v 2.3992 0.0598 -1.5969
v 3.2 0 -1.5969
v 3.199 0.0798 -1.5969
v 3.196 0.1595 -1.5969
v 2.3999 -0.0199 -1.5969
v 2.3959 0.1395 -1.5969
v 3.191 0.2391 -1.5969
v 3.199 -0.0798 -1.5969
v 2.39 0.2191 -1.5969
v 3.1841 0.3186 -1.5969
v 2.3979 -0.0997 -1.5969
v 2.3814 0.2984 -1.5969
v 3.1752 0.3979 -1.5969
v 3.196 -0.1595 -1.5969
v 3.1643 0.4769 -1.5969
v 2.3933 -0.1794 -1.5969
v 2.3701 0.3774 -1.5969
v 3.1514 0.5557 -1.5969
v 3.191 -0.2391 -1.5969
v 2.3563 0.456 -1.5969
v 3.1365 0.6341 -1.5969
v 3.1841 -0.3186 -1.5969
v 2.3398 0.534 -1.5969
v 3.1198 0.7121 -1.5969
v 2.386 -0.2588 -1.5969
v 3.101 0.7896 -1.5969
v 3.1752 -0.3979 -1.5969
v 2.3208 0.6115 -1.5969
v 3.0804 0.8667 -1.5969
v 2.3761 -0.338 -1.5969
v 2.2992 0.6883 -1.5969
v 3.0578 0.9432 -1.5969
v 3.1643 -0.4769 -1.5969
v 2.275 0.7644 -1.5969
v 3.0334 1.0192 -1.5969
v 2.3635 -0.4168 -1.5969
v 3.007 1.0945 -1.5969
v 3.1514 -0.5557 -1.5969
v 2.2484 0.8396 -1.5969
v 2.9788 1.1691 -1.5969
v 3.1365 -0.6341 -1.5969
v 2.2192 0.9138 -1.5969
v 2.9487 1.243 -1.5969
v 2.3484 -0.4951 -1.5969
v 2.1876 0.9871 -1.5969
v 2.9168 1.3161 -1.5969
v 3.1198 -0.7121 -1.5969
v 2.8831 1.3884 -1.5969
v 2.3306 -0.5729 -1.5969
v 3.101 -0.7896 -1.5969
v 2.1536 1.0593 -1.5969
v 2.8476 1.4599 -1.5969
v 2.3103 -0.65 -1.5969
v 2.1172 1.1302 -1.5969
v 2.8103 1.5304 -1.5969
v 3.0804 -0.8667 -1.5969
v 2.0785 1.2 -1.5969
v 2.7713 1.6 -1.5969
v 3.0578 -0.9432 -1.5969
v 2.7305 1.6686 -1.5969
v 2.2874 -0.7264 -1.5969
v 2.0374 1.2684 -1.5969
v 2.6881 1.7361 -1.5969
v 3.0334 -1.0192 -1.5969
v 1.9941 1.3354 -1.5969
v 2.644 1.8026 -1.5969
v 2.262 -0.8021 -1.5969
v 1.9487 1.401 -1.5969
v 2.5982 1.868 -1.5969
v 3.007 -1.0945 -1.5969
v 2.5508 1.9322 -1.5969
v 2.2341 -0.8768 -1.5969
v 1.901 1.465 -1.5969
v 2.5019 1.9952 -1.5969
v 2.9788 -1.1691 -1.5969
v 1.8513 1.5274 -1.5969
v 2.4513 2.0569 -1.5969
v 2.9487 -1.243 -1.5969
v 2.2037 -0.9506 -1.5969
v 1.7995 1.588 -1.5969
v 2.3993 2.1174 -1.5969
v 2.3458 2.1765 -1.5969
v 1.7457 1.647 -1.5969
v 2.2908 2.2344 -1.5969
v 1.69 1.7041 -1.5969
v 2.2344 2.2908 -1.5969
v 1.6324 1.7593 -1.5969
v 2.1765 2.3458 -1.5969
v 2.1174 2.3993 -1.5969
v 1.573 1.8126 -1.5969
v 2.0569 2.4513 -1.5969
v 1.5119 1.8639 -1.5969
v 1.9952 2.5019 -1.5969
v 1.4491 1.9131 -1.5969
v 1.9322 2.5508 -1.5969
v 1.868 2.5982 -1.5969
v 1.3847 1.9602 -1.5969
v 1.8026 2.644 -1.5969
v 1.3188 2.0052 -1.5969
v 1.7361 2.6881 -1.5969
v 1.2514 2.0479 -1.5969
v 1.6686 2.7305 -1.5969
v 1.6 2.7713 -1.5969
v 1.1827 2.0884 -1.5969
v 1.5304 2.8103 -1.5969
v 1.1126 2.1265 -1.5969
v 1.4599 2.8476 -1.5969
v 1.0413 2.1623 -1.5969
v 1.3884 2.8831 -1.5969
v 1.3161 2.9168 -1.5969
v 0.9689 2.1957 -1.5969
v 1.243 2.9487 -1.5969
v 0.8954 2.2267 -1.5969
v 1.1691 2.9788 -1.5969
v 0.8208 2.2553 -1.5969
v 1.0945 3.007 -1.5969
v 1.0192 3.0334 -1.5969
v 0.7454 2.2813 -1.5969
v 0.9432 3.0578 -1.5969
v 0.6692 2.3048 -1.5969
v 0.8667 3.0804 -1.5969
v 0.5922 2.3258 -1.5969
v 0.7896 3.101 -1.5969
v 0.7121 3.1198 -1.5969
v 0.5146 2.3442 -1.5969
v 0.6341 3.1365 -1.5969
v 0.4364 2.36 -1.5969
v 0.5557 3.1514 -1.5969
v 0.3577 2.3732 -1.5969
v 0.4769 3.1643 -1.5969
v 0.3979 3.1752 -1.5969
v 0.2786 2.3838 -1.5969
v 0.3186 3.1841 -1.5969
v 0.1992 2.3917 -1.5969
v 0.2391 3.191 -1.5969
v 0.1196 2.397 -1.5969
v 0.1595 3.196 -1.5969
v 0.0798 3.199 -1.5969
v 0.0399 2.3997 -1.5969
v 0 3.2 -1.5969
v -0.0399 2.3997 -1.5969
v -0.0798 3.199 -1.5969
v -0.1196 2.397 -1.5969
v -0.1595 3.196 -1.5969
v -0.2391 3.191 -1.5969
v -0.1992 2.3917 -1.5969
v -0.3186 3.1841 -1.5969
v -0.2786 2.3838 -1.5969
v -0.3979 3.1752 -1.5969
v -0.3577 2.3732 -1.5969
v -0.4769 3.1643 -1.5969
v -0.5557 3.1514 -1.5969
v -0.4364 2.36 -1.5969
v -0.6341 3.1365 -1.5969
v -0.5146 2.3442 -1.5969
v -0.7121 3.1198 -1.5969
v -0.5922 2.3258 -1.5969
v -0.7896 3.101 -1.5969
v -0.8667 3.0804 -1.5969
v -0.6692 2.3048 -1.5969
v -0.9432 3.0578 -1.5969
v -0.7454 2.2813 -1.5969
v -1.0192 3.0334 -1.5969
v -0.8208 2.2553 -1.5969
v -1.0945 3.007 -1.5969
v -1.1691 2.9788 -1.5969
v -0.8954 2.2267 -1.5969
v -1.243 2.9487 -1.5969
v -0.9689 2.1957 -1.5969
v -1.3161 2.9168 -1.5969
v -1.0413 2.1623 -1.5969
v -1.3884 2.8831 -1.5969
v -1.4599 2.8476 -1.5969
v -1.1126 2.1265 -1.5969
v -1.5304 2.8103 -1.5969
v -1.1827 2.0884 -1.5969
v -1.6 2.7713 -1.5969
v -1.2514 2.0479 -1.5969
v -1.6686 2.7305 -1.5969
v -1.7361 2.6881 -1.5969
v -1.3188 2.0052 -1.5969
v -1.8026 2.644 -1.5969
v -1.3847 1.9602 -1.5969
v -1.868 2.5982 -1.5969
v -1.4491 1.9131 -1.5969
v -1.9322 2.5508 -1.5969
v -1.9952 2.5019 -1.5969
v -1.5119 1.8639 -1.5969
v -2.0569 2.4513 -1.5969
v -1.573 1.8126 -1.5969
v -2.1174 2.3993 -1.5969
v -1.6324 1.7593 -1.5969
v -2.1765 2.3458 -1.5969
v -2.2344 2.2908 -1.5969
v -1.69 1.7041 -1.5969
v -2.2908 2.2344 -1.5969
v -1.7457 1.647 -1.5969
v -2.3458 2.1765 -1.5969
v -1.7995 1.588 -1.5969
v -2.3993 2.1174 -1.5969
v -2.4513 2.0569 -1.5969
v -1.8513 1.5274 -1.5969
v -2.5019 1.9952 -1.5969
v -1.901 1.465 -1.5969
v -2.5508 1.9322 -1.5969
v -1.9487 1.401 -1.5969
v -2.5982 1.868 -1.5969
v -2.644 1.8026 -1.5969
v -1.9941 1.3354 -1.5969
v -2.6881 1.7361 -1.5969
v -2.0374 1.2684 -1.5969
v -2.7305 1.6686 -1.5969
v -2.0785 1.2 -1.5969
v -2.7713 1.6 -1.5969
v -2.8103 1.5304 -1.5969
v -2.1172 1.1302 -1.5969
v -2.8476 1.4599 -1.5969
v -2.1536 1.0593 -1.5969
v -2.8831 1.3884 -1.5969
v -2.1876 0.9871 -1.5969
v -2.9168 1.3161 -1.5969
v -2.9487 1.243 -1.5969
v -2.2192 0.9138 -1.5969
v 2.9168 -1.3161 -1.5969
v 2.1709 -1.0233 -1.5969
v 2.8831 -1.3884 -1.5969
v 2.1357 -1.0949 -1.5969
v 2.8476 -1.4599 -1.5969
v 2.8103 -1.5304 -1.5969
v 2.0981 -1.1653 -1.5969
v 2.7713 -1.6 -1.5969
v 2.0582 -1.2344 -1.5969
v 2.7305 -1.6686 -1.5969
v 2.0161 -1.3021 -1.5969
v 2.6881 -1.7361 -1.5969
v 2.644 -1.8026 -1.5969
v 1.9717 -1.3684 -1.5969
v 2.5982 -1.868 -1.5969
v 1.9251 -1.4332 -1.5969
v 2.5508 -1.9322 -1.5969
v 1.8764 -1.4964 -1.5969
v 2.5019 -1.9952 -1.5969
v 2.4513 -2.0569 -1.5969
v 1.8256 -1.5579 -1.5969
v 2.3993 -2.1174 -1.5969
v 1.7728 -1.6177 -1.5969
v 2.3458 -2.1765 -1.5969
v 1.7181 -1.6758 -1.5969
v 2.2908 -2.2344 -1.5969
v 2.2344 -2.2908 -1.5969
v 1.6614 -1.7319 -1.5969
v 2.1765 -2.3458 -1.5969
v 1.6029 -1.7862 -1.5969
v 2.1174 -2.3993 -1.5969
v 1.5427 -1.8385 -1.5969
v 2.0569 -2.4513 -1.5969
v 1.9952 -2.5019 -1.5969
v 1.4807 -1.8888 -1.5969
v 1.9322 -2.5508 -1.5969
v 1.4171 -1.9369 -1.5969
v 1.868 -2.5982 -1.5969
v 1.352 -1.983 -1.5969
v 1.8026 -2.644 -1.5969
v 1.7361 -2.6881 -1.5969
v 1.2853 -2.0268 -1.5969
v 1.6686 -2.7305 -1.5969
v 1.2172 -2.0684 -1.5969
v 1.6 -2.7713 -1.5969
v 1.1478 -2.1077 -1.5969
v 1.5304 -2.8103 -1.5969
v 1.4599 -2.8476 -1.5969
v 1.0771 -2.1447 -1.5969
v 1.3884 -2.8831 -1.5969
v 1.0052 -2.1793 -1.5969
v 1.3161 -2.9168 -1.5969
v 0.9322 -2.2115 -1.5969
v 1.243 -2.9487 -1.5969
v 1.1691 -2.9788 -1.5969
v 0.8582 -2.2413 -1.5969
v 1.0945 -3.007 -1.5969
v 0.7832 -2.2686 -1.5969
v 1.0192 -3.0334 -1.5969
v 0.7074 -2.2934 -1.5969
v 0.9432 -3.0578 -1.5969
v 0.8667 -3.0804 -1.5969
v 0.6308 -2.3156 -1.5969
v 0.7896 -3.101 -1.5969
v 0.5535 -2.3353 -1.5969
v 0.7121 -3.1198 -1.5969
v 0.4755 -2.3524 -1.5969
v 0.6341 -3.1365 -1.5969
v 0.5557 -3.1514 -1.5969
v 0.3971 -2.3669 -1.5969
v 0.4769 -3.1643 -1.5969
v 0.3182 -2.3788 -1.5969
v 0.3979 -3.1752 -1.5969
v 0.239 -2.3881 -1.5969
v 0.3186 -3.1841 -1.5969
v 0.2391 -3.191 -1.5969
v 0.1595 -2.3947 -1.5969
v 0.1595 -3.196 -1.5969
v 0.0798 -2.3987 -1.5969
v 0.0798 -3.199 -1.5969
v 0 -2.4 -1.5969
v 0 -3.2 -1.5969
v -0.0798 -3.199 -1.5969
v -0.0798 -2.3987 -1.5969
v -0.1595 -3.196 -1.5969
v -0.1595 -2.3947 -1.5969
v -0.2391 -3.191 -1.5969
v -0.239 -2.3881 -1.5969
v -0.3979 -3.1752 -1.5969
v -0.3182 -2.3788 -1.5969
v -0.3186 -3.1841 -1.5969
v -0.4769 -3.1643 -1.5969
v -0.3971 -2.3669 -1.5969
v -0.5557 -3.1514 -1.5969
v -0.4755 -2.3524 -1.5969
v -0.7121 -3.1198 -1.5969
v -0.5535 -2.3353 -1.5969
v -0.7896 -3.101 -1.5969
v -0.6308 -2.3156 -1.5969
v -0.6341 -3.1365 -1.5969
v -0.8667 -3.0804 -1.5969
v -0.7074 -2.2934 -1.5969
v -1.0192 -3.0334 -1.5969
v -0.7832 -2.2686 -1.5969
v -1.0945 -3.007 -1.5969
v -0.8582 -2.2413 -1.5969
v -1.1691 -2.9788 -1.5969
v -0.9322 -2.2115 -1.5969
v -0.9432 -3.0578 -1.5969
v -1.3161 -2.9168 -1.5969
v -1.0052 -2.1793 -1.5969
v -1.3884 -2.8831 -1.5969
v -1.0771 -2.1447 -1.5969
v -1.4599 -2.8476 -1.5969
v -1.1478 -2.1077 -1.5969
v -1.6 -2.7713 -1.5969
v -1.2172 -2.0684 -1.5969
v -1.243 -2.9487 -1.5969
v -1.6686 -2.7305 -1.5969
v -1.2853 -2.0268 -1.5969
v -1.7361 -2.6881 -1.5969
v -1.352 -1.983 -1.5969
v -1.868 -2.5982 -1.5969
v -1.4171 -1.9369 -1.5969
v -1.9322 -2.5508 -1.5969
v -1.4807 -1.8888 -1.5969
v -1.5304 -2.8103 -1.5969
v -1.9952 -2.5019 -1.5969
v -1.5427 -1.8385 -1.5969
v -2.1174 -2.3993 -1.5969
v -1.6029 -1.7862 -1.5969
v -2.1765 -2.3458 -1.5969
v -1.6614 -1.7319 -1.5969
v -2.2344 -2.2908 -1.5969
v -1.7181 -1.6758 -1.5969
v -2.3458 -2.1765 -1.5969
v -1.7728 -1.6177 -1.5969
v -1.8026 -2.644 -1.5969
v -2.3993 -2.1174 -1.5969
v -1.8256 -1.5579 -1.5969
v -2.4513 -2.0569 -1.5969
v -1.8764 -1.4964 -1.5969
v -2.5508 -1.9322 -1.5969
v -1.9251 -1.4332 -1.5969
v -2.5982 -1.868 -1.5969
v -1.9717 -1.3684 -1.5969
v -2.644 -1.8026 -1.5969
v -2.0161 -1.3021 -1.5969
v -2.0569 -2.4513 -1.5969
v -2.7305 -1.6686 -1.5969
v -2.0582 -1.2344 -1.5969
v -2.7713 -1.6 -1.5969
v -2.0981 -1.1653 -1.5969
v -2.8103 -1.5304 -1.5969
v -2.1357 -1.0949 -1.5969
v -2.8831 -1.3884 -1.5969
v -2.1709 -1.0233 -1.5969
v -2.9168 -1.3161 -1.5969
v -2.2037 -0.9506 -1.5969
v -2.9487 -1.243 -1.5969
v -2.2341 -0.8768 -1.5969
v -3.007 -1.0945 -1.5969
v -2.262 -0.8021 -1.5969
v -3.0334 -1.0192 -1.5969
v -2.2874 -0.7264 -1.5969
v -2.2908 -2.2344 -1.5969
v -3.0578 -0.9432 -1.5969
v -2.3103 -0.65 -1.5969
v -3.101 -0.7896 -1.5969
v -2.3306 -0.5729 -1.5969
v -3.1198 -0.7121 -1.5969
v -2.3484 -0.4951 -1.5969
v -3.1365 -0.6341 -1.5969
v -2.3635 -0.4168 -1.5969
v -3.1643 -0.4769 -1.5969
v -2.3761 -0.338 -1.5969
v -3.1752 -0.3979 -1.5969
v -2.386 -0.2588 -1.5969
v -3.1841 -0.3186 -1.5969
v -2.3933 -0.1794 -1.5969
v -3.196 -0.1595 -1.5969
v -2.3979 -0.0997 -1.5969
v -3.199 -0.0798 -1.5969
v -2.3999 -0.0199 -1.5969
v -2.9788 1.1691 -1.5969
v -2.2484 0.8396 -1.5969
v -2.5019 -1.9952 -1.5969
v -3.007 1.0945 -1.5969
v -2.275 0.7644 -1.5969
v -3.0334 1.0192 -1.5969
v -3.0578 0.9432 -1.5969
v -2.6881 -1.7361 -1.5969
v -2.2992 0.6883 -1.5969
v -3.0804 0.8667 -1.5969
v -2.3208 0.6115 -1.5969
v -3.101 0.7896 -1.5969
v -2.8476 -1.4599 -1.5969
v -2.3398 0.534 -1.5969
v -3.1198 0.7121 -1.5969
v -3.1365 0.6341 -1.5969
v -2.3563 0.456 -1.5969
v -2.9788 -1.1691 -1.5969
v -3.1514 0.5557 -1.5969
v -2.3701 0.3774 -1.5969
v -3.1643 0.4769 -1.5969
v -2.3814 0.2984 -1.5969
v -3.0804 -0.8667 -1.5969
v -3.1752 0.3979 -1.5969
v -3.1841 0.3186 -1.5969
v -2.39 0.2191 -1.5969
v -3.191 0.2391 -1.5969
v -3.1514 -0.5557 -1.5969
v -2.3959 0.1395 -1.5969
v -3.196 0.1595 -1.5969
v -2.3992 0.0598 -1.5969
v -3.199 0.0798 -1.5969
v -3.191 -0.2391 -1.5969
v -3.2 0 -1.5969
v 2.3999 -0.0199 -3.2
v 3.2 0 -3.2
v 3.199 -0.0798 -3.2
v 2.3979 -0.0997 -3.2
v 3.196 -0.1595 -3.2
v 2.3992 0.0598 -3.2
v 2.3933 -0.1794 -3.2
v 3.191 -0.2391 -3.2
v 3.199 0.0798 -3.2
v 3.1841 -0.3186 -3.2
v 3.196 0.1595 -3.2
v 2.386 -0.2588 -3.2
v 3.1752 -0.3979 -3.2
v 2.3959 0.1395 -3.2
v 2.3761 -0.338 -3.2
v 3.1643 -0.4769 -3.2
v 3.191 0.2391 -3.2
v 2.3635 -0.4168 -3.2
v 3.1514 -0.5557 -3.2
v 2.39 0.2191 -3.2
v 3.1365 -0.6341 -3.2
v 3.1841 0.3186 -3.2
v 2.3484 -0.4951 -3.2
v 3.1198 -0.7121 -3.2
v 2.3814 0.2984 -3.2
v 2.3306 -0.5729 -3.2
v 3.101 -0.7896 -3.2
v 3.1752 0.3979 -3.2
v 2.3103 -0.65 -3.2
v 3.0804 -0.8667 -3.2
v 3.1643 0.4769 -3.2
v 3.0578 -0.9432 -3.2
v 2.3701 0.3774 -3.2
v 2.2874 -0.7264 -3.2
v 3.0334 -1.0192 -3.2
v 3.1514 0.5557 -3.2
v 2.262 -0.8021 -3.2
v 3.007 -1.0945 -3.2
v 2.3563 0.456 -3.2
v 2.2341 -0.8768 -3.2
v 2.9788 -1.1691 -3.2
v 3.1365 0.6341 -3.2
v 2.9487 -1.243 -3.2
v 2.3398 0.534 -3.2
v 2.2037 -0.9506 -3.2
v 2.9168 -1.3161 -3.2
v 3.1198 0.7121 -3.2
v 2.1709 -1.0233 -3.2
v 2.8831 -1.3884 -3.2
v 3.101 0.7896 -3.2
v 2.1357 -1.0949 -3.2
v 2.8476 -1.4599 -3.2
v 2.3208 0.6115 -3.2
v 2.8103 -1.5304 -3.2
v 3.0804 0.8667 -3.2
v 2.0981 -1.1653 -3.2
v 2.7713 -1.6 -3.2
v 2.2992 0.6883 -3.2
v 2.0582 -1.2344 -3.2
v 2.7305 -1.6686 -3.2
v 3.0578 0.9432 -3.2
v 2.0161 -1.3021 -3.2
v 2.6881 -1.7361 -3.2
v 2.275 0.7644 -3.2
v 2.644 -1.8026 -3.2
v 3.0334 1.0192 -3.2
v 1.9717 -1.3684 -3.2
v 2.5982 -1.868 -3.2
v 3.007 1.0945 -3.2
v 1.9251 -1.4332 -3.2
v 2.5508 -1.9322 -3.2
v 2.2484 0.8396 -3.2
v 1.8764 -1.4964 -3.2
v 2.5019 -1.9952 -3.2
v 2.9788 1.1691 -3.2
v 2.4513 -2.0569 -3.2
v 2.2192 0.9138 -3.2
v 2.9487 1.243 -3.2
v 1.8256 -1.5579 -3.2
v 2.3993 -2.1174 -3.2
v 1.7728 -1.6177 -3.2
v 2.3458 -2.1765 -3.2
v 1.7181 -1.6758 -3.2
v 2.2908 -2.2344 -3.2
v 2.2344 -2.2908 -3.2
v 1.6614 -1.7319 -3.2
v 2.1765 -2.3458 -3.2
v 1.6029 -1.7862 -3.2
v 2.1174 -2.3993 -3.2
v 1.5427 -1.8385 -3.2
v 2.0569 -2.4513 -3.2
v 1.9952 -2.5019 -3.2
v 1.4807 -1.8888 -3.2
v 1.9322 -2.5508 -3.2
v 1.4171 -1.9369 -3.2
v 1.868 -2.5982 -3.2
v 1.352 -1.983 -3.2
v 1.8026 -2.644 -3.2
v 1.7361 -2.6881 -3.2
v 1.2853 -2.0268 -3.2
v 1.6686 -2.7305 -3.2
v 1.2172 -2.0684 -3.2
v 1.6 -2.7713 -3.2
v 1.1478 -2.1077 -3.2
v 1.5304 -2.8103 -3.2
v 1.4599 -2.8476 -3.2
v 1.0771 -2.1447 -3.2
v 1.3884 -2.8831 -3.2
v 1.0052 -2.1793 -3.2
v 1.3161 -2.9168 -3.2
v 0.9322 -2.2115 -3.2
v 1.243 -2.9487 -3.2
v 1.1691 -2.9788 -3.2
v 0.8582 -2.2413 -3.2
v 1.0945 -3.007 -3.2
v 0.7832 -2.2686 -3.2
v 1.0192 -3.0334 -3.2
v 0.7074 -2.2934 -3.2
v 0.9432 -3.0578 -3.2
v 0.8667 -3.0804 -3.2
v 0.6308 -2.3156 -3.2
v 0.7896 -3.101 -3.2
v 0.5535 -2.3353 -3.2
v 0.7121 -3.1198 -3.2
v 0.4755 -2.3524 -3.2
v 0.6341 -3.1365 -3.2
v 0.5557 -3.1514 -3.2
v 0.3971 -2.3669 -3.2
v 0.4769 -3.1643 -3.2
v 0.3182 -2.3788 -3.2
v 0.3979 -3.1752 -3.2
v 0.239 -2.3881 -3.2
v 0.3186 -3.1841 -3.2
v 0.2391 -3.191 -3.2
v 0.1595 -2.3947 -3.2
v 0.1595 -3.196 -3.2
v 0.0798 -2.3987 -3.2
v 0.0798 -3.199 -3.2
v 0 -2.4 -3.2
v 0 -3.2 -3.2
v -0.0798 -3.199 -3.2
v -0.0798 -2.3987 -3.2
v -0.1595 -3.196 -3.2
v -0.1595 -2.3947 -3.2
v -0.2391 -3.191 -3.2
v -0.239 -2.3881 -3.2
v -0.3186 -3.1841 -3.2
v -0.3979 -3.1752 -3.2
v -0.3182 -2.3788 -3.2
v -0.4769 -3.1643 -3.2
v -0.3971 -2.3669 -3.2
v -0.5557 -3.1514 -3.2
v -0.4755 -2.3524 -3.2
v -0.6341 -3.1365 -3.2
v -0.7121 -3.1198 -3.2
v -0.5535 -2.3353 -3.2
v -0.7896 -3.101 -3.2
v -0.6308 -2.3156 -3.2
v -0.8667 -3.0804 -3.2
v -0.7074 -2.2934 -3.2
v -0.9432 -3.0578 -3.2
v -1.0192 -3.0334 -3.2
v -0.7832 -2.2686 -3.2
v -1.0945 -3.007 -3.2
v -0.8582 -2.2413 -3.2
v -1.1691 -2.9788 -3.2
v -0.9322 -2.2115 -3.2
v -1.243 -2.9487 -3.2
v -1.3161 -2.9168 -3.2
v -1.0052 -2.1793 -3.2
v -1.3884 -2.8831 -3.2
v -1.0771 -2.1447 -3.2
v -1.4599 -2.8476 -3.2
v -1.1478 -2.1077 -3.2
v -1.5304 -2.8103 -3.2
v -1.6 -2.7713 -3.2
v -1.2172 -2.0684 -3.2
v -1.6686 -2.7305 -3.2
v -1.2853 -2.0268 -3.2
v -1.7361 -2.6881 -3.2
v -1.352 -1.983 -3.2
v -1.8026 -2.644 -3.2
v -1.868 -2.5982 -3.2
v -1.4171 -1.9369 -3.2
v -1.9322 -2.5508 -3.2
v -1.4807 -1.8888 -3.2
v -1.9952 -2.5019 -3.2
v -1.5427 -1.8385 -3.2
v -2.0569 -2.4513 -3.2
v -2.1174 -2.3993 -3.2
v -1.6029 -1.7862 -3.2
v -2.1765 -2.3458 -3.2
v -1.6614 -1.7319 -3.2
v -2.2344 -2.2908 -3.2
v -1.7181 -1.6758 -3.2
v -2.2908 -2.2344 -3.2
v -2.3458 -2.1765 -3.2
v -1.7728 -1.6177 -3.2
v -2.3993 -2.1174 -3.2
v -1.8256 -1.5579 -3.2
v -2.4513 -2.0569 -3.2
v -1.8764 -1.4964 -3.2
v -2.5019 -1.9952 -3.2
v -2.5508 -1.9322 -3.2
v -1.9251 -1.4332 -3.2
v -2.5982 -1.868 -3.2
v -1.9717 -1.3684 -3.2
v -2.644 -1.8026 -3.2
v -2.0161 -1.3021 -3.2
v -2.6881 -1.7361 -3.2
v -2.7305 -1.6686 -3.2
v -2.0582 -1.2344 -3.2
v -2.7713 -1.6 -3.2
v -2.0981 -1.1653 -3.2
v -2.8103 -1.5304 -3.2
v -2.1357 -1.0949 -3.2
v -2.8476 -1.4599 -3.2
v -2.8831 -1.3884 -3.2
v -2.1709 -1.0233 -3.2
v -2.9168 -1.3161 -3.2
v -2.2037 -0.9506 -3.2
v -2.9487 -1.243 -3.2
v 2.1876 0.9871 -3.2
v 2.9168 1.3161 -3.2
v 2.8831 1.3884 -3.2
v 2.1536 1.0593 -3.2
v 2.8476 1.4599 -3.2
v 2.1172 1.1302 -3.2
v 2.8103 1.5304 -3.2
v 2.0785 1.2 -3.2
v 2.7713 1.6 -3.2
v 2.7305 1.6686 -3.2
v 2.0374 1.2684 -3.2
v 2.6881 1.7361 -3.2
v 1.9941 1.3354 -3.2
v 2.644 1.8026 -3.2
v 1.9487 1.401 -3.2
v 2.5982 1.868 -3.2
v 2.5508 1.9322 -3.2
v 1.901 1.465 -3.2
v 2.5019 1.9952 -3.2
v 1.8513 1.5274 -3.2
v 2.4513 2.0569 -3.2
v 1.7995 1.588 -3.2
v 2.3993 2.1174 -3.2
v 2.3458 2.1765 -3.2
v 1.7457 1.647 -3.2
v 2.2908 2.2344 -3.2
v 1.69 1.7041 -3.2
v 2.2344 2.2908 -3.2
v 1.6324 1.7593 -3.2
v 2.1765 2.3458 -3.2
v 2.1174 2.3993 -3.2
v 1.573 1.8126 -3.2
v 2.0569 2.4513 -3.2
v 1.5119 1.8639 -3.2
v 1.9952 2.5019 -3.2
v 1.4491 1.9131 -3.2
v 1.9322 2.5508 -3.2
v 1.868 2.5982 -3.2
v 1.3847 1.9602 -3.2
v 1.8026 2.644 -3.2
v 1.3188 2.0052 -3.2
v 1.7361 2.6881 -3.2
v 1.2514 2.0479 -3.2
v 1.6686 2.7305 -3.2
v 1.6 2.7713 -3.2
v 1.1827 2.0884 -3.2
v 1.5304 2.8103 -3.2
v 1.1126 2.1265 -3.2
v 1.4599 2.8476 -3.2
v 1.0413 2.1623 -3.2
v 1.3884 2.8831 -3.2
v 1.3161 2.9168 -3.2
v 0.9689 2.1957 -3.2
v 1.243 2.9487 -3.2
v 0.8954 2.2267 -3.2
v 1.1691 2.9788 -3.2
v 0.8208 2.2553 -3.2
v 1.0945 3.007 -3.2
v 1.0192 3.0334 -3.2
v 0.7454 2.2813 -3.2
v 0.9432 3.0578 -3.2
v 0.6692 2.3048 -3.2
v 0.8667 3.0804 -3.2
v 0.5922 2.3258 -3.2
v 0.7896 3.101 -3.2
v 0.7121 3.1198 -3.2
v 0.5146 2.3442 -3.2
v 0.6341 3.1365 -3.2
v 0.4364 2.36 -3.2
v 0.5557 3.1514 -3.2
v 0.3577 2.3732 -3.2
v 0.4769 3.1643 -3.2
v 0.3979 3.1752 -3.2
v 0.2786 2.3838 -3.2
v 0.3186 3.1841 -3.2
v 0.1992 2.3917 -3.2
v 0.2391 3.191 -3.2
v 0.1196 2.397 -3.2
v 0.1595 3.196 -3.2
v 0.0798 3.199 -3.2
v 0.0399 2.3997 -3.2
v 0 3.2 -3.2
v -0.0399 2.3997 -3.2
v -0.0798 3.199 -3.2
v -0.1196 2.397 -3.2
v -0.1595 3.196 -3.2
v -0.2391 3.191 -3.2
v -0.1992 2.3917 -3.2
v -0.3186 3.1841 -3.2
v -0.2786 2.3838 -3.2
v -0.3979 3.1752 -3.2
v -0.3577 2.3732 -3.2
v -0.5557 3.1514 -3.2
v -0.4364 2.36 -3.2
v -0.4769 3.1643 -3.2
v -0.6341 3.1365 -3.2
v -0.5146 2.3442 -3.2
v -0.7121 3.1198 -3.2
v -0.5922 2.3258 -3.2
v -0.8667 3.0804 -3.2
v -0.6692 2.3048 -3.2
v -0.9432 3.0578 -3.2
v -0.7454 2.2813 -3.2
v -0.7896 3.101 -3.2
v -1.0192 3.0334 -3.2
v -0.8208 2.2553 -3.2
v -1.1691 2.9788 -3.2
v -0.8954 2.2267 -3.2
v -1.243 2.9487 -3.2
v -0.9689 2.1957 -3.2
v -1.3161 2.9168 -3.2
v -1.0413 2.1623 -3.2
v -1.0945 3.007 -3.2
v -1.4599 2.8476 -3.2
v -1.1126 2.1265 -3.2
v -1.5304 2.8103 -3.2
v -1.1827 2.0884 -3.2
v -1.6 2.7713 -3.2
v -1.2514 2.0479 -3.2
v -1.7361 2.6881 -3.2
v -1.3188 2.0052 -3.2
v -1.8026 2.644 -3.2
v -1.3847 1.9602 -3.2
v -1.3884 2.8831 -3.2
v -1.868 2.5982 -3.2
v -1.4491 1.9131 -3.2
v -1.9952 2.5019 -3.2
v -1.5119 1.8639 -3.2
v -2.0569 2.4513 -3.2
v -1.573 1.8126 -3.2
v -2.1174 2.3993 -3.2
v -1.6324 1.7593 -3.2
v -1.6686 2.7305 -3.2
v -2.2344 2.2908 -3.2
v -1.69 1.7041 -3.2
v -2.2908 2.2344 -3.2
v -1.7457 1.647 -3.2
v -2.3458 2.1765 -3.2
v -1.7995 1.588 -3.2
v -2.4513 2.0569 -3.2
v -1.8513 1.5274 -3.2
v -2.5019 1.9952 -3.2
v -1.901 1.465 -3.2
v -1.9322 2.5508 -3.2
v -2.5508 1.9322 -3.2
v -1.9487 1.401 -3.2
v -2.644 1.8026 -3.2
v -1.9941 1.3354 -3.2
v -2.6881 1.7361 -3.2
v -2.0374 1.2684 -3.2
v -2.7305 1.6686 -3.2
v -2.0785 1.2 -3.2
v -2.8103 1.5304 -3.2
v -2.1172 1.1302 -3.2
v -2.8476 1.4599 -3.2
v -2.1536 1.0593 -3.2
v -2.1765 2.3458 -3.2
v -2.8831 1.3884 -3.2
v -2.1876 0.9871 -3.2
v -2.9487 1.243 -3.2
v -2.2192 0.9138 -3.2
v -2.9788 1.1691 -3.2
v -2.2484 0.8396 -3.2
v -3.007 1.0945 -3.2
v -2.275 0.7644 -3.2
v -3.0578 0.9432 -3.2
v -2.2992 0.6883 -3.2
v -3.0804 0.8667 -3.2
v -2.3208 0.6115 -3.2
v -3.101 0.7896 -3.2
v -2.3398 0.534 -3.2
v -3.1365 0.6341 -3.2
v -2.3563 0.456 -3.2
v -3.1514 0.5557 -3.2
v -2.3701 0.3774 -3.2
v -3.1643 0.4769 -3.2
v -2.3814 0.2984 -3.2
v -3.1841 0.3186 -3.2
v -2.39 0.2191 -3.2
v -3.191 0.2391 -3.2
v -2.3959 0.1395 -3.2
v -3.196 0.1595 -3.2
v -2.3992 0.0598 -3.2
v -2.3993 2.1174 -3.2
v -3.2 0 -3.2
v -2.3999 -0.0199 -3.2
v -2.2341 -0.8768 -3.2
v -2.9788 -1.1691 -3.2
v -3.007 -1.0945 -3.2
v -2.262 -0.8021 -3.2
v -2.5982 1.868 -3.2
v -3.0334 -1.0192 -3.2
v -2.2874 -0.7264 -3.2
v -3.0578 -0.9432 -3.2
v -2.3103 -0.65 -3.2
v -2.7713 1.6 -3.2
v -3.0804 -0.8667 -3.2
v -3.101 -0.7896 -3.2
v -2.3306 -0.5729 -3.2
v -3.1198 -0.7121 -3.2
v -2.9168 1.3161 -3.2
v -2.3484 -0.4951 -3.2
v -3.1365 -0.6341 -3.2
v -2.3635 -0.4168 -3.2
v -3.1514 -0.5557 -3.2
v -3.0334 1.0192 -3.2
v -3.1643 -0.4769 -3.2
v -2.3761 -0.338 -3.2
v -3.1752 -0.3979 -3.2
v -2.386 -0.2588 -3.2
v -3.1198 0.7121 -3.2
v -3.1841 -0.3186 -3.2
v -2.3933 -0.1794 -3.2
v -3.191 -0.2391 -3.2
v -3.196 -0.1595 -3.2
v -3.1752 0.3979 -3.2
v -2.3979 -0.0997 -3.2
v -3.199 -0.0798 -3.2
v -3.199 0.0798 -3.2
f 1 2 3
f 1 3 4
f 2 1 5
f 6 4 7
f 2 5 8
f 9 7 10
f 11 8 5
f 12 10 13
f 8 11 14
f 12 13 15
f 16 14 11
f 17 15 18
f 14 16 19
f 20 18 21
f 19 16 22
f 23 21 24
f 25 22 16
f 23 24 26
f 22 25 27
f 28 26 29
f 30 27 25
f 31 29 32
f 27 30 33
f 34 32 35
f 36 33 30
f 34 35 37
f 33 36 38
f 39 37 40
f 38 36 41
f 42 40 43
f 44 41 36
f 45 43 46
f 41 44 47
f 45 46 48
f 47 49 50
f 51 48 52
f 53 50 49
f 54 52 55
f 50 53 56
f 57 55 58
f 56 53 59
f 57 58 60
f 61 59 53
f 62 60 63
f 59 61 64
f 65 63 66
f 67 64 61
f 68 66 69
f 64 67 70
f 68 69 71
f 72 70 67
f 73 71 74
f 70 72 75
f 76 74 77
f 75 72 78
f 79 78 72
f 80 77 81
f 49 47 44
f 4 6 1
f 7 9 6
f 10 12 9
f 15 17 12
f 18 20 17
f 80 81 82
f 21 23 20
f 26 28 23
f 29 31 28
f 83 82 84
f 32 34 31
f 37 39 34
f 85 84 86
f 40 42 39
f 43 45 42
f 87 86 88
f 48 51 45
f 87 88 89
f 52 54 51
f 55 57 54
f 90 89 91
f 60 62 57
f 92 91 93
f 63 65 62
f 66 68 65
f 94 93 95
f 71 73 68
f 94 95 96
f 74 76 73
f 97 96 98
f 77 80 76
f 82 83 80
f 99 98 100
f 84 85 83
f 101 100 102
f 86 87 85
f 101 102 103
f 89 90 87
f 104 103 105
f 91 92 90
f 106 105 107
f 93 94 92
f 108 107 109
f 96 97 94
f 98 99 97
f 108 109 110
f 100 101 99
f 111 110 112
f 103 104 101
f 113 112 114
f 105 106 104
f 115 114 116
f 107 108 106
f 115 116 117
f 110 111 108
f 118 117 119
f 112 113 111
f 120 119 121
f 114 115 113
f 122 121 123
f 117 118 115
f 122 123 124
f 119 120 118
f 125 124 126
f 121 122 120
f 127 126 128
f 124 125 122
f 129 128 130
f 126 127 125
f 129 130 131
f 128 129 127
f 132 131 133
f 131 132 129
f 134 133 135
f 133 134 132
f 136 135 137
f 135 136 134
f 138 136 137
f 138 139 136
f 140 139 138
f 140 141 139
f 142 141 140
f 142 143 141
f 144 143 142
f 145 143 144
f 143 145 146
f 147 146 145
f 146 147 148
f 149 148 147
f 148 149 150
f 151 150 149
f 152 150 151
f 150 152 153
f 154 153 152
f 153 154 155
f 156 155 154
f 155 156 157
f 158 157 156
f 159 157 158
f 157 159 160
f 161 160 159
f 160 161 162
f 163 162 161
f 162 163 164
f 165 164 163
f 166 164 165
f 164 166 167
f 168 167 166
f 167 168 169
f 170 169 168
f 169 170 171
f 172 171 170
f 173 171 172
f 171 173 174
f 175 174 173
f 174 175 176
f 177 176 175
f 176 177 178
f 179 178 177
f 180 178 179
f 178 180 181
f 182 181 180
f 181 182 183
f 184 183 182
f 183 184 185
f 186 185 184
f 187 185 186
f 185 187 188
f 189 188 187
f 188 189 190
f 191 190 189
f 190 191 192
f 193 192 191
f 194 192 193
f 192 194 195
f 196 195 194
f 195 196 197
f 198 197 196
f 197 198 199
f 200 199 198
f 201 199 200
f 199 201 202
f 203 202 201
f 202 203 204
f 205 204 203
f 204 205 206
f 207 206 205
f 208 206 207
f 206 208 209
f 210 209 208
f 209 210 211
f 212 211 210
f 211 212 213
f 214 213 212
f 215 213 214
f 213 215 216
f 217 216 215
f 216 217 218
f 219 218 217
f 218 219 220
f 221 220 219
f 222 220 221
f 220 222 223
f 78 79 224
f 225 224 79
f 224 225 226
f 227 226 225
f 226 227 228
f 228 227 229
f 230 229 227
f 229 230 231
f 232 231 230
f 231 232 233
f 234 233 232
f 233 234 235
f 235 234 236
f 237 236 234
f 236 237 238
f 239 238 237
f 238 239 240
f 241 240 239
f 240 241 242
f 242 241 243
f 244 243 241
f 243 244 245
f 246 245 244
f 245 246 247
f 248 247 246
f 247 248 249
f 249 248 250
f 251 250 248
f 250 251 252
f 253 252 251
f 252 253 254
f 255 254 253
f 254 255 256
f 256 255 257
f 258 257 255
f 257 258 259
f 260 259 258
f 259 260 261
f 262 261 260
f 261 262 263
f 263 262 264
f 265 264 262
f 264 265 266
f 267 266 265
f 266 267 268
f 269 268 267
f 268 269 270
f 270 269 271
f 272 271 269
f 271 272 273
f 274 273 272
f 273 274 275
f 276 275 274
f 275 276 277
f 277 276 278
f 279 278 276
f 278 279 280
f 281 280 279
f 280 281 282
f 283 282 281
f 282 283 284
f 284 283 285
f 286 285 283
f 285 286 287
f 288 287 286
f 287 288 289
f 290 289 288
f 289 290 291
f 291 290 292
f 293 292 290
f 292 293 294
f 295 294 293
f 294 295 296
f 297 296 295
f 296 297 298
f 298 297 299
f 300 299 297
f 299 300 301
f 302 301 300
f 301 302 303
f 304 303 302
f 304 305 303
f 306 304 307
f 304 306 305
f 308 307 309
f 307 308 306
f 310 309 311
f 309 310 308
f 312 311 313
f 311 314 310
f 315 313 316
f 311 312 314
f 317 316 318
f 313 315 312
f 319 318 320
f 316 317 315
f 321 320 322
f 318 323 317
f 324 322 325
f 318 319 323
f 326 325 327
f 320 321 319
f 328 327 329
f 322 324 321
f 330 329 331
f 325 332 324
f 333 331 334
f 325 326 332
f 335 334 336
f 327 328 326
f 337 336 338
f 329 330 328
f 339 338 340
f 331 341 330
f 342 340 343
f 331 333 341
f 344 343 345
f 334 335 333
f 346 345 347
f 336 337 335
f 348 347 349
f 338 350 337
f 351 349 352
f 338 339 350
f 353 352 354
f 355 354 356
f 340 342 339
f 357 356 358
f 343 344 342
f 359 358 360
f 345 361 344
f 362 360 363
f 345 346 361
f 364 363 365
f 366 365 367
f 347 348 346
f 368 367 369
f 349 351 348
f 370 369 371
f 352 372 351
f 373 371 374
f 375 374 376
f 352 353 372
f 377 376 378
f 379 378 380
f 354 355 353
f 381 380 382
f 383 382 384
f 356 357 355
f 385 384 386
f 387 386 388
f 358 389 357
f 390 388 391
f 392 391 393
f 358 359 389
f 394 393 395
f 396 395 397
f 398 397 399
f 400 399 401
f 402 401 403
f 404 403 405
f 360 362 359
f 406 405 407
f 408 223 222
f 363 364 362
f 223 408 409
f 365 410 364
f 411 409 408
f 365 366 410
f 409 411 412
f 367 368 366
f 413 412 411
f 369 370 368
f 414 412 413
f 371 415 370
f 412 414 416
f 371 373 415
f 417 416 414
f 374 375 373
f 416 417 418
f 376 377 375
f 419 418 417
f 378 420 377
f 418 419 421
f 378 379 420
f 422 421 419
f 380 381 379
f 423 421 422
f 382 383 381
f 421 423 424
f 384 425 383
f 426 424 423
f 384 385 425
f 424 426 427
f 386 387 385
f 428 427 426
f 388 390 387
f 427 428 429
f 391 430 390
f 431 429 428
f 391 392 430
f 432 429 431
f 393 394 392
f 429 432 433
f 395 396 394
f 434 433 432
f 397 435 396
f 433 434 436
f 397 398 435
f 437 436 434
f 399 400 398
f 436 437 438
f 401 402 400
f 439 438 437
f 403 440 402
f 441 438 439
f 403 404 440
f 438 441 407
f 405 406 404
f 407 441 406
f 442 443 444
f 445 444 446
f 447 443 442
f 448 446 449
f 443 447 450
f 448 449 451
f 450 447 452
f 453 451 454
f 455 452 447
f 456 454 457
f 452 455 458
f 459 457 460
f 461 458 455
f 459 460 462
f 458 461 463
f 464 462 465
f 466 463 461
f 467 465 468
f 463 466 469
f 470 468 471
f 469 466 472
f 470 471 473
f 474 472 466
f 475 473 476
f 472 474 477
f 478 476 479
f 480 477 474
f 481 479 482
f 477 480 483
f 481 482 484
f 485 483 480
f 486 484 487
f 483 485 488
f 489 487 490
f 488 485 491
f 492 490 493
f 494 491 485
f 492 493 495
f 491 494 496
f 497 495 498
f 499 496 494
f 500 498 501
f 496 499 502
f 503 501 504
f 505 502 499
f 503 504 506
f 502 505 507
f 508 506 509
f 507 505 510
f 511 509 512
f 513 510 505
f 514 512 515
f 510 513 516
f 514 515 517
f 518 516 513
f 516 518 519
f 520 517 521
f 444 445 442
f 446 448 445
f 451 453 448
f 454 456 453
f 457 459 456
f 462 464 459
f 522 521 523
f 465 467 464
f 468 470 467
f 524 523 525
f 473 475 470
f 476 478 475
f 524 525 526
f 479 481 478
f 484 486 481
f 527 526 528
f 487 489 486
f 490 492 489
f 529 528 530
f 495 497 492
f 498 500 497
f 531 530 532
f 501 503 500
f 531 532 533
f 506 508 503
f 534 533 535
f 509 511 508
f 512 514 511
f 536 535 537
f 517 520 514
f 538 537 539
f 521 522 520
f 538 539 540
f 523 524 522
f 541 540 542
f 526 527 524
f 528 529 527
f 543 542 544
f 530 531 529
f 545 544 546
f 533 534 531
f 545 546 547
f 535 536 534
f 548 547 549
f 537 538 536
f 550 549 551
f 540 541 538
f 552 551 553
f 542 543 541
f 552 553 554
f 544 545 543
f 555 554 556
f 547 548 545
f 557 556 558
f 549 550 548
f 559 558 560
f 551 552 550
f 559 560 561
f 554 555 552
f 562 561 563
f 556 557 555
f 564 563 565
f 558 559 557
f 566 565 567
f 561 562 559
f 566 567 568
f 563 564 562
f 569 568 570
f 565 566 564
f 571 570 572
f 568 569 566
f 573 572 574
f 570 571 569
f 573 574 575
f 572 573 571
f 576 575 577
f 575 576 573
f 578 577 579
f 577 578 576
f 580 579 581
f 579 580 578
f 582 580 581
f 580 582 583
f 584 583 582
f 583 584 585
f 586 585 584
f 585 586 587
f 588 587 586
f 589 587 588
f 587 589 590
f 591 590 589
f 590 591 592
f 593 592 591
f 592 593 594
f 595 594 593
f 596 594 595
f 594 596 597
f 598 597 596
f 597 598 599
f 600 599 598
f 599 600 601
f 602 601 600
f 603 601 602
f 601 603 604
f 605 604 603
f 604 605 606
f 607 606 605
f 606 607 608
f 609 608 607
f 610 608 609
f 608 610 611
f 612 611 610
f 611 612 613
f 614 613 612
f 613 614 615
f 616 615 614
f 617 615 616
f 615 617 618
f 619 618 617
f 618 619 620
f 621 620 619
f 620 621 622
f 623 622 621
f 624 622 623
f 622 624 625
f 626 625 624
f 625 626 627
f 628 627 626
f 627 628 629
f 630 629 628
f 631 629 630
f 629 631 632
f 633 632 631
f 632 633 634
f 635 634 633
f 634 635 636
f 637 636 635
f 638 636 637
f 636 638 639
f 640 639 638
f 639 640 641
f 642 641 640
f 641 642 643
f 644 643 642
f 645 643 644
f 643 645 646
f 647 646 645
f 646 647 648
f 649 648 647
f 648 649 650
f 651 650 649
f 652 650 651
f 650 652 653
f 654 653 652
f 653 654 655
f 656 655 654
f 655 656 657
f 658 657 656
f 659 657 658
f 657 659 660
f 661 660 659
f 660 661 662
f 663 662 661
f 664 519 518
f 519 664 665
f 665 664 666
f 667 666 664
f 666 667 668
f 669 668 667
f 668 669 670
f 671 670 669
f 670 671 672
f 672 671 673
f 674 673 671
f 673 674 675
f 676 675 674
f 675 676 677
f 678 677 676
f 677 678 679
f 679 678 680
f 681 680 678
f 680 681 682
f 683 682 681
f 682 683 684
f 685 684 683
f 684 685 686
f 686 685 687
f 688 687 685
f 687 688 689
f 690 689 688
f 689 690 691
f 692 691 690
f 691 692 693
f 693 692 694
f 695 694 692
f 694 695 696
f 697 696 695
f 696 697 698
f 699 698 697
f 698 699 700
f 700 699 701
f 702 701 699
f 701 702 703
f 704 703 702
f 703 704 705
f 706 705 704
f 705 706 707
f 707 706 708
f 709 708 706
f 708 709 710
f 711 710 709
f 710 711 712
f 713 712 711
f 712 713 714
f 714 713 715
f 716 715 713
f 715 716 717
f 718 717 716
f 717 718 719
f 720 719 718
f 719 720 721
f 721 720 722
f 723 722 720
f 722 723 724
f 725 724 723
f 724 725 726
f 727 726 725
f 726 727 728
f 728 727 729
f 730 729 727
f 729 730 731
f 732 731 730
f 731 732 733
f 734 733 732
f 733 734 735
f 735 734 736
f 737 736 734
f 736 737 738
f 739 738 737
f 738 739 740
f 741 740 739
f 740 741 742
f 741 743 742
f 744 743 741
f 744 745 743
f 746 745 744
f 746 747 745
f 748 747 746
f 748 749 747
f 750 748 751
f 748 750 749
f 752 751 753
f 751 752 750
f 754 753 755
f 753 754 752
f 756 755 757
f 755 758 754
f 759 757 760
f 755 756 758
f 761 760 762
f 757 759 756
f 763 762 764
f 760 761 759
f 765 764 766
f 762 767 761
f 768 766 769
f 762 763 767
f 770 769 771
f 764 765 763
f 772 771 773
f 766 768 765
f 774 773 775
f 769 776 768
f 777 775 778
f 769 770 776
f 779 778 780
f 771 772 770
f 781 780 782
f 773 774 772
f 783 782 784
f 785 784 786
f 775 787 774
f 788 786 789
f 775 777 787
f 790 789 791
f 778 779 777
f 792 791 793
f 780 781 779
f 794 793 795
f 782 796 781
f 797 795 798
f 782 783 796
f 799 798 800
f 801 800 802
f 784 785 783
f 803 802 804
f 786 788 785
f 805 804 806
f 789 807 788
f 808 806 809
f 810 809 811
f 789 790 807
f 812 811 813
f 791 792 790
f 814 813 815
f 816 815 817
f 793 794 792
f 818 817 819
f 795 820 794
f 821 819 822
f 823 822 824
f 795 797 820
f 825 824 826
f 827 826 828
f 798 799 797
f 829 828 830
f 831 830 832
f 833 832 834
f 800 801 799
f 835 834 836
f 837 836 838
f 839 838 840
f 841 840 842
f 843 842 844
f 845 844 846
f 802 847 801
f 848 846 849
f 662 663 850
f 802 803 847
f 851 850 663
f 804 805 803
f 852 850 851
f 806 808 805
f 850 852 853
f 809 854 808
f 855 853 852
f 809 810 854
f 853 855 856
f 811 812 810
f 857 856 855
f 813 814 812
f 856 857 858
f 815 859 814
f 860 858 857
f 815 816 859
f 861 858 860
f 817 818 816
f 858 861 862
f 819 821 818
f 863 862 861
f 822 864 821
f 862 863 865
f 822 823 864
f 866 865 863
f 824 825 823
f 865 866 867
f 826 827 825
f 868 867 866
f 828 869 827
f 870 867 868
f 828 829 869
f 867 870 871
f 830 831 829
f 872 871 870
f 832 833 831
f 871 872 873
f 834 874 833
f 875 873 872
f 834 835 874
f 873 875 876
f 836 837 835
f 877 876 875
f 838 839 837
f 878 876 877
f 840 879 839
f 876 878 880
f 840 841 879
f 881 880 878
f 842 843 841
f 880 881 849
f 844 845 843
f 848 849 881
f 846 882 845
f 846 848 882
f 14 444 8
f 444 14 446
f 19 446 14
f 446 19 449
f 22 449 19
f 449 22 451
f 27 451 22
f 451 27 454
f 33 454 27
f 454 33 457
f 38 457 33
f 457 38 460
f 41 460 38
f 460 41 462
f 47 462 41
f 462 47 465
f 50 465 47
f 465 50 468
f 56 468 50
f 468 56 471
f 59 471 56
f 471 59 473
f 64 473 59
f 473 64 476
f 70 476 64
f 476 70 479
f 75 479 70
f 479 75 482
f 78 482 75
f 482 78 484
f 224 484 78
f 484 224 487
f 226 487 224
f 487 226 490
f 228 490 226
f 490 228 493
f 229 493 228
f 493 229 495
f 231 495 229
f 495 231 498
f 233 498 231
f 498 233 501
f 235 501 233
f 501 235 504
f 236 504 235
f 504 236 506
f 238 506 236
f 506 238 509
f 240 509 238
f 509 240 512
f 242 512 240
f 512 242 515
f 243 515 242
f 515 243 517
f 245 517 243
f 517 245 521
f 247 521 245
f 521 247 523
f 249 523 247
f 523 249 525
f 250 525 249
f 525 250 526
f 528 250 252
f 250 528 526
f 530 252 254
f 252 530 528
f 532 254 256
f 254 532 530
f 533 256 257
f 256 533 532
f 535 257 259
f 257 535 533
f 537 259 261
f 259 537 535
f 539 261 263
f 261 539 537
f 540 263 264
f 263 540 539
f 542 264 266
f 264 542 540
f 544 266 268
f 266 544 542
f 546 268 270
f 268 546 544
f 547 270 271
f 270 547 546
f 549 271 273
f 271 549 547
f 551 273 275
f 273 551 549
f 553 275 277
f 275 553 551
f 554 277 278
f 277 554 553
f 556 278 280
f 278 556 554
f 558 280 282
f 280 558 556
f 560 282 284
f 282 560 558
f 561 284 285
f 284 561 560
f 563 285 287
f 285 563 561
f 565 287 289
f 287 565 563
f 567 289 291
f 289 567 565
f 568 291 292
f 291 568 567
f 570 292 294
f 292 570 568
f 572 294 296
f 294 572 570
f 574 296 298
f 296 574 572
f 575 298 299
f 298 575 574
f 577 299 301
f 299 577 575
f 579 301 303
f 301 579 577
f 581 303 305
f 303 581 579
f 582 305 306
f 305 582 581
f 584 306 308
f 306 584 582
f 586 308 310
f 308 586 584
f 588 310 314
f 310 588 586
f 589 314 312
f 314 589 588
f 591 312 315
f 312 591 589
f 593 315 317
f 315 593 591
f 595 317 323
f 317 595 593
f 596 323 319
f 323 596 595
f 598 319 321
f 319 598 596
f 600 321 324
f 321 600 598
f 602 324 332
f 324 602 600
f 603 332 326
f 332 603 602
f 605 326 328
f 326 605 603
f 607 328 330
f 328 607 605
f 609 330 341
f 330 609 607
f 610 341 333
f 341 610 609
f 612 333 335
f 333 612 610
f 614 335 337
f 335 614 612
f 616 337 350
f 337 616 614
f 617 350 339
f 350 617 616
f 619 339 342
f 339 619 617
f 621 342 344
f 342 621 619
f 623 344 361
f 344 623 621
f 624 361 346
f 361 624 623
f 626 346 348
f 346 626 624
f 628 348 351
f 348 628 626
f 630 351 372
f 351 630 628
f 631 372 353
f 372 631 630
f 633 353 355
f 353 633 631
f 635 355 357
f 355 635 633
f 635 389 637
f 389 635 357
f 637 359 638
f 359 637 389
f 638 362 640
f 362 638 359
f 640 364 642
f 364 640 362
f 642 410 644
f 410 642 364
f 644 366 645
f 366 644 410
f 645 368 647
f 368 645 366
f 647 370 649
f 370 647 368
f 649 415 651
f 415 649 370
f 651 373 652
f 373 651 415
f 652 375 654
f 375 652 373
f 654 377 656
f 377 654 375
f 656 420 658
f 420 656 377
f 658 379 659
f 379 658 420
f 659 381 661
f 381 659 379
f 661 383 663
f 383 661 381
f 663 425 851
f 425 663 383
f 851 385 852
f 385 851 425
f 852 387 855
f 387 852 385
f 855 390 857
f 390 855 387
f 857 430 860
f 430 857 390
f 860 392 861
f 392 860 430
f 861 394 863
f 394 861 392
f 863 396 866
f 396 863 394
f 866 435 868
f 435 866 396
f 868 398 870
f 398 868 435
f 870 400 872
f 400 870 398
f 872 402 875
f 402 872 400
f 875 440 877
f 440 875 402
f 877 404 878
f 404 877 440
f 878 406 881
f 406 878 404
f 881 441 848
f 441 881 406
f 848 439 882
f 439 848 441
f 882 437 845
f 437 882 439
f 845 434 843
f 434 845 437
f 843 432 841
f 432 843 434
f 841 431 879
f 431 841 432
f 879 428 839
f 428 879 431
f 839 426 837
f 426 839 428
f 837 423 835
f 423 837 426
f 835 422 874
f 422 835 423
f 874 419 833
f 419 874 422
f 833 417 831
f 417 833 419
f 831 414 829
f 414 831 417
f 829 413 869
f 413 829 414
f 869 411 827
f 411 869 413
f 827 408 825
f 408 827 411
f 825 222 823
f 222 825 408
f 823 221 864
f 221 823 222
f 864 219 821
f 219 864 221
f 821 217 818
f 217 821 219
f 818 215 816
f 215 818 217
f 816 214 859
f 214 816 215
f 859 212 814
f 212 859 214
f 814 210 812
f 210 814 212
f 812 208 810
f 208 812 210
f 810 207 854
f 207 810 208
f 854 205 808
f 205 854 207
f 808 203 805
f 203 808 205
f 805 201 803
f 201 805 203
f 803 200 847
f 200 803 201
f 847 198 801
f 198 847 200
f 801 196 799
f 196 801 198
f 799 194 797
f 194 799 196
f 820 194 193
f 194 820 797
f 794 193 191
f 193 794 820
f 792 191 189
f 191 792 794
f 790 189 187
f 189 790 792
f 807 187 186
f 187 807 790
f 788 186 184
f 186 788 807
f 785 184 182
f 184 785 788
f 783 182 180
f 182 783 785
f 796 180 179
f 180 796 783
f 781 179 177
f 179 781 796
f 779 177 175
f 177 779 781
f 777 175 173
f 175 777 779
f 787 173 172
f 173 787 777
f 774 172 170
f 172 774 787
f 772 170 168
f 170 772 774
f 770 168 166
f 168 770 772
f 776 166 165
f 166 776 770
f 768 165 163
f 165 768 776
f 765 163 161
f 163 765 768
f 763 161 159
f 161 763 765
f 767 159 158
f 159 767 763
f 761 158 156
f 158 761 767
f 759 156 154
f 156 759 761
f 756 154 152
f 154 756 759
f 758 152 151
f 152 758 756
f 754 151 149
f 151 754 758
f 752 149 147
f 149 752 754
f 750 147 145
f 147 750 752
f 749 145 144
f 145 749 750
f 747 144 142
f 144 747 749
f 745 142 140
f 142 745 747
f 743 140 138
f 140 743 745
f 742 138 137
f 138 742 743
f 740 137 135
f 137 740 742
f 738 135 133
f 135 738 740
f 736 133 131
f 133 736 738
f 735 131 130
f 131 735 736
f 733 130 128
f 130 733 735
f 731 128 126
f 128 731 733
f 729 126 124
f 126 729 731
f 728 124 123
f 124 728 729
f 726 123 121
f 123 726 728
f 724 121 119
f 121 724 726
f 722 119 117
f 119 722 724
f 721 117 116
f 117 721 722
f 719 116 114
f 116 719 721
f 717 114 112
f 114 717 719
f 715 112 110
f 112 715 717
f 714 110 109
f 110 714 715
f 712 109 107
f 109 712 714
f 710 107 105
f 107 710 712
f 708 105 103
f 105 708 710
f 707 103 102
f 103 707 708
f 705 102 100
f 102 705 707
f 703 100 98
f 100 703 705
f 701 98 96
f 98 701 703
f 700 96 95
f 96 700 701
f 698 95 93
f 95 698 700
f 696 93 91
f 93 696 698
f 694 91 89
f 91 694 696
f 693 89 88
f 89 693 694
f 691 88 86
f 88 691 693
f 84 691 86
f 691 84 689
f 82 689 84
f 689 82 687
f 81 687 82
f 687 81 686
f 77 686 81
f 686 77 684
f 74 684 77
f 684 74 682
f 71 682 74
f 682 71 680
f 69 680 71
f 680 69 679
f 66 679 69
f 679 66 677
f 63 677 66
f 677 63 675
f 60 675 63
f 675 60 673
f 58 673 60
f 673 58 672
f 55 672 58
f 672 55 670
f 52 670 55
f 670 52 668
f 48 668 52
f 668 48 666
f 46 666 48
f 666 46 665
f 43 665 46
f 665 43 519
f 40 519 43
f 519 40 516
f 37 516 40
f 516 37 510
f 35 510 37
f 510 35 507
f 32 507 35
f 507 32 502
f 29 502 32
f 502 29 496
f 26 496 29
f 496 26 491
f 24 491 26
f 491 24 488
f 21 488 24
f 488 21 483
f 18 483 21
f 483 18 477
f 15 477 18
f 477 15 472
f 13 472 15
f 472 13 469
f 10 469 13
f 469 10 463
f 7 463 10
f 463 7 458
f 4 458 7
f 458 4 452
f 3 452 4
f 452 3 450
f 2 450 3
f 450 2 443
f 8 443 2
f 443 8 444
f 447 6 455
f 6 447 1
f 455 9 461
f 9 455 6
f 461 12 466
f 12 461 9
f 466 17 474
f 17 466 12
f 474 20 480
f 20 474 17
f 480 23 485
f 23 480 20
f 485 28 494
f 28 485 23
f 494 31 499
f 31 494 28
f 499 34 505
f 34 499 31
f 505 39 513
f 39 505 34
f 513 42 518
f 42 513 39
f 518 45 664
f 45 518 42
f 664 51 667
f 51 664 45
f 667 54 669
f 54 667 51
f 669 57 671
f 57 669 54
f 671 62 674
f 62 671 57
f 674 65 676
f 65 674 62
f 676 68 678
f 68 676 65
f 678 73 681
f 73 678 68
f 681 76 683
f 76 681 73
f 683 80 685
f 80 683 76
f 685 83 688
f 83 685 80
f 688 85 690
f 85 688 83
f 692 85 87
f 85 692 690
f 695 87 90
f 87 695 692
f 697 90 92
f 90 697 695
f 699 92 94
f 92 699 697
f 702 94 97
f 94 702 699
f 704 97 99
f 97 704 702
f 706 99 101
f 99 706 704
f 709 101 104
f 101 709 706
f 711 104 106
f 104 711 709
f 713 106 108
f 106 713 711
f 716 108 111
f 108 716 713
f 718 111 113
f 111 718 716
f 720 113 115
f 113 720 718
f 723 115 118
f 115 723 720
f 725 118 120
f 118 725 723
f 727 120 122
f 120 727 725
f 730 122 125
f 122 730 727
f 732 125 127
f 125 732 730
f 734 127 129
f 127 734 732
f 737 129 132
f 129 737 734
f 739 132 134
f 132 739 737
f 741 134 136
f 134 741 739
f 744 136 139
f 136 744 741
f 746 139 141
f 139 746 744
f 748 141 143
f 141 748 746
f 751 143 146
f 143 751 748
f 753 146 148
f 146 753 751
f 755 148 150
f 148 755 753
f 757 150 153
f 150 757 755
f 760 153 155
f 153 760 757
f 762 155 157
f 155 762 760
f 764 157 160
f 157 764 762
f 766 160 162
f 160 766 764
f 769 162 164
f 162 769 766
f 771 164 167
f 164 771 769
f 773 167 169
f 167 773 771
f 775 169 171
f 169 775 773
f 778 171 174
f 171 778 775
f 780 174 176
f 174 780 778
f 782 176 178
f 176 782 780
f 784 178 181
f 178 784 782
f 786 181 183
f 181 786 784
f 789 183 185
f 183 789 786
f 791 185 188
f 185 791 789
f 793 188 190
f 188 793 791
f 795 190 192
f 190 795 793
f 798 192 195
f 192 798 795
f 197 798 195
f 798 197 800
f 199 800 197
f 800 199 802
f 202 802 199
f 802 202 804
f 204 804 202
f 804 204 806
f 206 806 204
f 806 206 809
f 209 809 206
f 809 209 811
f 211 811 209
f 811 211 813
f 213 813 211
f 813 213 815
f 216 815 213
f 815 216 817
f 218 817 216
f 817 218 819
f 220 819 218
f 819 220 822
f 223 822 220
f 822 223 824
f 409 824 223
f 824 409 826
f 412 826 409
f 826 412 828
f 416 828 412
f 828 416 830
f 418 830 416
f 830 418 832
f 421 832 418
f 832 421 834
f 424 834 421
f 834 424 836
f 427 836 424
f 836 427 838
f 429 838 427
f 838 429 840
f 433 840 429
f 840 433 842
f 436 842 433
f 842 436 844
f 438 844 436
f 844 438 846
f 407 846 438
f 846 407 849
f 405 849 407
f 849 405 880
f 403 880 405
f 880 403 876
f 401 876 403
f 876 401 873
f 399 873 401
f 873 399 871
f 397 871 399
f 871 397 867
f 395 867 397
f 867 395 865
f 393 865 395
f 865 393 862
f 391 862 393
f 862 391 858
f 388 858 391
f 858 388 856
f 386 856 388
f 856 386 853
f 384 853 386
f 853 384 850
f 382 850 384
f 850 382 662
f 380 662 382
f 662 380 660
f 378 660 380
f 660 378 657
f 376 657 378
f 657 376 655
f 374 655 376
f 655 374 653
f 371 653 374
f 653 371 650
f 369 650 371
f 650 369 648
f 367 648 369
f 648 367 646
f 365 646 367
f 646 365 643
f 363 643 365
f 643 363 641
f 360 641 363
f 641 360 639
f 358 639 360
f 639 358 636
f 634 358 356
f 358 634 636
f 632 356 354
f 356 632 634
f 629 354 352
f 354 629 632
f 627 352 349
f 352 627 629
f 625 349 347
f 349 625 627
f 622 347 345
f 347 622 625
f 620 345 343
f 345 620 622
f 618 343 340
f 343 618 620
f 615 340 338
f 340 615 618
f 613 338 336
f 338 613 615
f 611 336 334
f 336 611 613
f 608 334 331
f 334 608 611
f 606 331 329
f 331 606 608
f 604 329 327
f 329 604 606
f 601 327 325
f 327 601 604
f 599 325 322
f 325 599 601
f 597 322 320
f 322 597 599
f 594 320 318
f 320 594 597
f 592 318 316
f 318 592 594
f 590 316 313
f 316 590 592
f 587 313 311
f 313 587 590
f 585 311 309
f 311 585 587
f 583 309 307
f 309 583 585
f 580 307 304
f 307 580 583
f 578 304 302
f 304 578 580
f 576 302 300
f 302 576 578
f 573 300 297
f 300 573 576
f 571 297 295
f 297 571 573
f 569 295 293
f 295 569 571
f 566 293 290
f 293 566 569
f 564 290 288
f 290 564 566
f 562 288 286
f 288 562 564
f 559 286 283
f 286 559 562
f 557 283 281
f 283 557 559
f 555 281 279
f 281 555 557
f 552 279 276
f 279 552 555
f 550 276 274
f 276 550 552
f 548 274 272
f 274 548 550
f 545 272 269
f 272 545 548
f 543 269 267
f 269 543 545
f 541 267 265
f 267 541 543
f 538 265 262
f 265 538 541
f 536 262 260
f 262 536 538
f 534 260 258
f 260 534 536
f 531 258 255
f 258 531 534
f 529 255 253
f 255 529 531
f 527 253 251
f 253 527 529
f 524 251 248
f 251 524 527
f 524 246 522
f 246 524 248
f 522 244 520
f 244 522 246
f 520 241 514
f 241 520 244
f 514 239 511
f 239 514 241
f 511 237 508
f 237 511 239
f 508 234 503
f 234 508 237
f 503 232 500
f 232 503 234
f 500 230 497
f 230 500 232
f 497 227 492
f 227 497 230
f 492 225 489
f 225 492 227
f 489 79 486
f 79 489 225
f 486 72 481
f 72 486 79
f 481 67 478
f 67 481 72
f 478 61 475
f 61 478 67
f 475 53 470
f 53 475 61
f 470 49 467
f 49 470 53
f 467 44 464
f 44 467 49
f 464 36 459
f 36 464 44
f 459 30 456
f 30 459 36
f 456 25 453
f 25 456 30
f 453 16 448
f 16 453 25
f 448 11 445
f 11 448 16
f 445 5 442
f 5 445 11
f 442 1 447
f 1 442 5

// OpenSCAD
use <../lib.scad>
use <43898.scad>
$fa=1; $fs=0.2;
function ldraw_lib__56640(realsolid=false) = [
// 0 =Dish  3 x  3 Inverted
// 0 Name: 56640.dat
// 0 Author: Rolf Osterthun [Rolf]
// 0 !LDRAW_ORG Part Alias UPDATE 2013-02
// 0 !LICENSE Licensed under CC BY 2.0 and CC BY 4.0 : see CAreadme.txt
// 
// 0 BFC CERTIFY CCW
  [0,"BFC","CERTIFY"],
  [0,"BFC","CCW"],
// 
// 0 !HISTORY 2013-12-23 [PTadmin] Official Update 2013-02
// 
// 
// 0 // Alias of 43898
// 0 // Part 56640 is the metallic lacquered counterpart of 43898
// 
// 1 16 0 0 0 1 0 0 0 1 0 0 0 1 43898.dat
  [1,16,0,0,0,1,0,0,0,1,0,0,0,1, ldraw_lib__43898(realsolid)],
];
module ldraw_lib__56640(step=0, col=false, unit=2/5, alt=false, line=0.2, solid=!$preview)
    makepoly(ldraw_lib__56640(solid), step=step, col=col, unit=unit, alt=alt, line=line, solid=solid);
ldraw_lib__56640(line=0.2);
